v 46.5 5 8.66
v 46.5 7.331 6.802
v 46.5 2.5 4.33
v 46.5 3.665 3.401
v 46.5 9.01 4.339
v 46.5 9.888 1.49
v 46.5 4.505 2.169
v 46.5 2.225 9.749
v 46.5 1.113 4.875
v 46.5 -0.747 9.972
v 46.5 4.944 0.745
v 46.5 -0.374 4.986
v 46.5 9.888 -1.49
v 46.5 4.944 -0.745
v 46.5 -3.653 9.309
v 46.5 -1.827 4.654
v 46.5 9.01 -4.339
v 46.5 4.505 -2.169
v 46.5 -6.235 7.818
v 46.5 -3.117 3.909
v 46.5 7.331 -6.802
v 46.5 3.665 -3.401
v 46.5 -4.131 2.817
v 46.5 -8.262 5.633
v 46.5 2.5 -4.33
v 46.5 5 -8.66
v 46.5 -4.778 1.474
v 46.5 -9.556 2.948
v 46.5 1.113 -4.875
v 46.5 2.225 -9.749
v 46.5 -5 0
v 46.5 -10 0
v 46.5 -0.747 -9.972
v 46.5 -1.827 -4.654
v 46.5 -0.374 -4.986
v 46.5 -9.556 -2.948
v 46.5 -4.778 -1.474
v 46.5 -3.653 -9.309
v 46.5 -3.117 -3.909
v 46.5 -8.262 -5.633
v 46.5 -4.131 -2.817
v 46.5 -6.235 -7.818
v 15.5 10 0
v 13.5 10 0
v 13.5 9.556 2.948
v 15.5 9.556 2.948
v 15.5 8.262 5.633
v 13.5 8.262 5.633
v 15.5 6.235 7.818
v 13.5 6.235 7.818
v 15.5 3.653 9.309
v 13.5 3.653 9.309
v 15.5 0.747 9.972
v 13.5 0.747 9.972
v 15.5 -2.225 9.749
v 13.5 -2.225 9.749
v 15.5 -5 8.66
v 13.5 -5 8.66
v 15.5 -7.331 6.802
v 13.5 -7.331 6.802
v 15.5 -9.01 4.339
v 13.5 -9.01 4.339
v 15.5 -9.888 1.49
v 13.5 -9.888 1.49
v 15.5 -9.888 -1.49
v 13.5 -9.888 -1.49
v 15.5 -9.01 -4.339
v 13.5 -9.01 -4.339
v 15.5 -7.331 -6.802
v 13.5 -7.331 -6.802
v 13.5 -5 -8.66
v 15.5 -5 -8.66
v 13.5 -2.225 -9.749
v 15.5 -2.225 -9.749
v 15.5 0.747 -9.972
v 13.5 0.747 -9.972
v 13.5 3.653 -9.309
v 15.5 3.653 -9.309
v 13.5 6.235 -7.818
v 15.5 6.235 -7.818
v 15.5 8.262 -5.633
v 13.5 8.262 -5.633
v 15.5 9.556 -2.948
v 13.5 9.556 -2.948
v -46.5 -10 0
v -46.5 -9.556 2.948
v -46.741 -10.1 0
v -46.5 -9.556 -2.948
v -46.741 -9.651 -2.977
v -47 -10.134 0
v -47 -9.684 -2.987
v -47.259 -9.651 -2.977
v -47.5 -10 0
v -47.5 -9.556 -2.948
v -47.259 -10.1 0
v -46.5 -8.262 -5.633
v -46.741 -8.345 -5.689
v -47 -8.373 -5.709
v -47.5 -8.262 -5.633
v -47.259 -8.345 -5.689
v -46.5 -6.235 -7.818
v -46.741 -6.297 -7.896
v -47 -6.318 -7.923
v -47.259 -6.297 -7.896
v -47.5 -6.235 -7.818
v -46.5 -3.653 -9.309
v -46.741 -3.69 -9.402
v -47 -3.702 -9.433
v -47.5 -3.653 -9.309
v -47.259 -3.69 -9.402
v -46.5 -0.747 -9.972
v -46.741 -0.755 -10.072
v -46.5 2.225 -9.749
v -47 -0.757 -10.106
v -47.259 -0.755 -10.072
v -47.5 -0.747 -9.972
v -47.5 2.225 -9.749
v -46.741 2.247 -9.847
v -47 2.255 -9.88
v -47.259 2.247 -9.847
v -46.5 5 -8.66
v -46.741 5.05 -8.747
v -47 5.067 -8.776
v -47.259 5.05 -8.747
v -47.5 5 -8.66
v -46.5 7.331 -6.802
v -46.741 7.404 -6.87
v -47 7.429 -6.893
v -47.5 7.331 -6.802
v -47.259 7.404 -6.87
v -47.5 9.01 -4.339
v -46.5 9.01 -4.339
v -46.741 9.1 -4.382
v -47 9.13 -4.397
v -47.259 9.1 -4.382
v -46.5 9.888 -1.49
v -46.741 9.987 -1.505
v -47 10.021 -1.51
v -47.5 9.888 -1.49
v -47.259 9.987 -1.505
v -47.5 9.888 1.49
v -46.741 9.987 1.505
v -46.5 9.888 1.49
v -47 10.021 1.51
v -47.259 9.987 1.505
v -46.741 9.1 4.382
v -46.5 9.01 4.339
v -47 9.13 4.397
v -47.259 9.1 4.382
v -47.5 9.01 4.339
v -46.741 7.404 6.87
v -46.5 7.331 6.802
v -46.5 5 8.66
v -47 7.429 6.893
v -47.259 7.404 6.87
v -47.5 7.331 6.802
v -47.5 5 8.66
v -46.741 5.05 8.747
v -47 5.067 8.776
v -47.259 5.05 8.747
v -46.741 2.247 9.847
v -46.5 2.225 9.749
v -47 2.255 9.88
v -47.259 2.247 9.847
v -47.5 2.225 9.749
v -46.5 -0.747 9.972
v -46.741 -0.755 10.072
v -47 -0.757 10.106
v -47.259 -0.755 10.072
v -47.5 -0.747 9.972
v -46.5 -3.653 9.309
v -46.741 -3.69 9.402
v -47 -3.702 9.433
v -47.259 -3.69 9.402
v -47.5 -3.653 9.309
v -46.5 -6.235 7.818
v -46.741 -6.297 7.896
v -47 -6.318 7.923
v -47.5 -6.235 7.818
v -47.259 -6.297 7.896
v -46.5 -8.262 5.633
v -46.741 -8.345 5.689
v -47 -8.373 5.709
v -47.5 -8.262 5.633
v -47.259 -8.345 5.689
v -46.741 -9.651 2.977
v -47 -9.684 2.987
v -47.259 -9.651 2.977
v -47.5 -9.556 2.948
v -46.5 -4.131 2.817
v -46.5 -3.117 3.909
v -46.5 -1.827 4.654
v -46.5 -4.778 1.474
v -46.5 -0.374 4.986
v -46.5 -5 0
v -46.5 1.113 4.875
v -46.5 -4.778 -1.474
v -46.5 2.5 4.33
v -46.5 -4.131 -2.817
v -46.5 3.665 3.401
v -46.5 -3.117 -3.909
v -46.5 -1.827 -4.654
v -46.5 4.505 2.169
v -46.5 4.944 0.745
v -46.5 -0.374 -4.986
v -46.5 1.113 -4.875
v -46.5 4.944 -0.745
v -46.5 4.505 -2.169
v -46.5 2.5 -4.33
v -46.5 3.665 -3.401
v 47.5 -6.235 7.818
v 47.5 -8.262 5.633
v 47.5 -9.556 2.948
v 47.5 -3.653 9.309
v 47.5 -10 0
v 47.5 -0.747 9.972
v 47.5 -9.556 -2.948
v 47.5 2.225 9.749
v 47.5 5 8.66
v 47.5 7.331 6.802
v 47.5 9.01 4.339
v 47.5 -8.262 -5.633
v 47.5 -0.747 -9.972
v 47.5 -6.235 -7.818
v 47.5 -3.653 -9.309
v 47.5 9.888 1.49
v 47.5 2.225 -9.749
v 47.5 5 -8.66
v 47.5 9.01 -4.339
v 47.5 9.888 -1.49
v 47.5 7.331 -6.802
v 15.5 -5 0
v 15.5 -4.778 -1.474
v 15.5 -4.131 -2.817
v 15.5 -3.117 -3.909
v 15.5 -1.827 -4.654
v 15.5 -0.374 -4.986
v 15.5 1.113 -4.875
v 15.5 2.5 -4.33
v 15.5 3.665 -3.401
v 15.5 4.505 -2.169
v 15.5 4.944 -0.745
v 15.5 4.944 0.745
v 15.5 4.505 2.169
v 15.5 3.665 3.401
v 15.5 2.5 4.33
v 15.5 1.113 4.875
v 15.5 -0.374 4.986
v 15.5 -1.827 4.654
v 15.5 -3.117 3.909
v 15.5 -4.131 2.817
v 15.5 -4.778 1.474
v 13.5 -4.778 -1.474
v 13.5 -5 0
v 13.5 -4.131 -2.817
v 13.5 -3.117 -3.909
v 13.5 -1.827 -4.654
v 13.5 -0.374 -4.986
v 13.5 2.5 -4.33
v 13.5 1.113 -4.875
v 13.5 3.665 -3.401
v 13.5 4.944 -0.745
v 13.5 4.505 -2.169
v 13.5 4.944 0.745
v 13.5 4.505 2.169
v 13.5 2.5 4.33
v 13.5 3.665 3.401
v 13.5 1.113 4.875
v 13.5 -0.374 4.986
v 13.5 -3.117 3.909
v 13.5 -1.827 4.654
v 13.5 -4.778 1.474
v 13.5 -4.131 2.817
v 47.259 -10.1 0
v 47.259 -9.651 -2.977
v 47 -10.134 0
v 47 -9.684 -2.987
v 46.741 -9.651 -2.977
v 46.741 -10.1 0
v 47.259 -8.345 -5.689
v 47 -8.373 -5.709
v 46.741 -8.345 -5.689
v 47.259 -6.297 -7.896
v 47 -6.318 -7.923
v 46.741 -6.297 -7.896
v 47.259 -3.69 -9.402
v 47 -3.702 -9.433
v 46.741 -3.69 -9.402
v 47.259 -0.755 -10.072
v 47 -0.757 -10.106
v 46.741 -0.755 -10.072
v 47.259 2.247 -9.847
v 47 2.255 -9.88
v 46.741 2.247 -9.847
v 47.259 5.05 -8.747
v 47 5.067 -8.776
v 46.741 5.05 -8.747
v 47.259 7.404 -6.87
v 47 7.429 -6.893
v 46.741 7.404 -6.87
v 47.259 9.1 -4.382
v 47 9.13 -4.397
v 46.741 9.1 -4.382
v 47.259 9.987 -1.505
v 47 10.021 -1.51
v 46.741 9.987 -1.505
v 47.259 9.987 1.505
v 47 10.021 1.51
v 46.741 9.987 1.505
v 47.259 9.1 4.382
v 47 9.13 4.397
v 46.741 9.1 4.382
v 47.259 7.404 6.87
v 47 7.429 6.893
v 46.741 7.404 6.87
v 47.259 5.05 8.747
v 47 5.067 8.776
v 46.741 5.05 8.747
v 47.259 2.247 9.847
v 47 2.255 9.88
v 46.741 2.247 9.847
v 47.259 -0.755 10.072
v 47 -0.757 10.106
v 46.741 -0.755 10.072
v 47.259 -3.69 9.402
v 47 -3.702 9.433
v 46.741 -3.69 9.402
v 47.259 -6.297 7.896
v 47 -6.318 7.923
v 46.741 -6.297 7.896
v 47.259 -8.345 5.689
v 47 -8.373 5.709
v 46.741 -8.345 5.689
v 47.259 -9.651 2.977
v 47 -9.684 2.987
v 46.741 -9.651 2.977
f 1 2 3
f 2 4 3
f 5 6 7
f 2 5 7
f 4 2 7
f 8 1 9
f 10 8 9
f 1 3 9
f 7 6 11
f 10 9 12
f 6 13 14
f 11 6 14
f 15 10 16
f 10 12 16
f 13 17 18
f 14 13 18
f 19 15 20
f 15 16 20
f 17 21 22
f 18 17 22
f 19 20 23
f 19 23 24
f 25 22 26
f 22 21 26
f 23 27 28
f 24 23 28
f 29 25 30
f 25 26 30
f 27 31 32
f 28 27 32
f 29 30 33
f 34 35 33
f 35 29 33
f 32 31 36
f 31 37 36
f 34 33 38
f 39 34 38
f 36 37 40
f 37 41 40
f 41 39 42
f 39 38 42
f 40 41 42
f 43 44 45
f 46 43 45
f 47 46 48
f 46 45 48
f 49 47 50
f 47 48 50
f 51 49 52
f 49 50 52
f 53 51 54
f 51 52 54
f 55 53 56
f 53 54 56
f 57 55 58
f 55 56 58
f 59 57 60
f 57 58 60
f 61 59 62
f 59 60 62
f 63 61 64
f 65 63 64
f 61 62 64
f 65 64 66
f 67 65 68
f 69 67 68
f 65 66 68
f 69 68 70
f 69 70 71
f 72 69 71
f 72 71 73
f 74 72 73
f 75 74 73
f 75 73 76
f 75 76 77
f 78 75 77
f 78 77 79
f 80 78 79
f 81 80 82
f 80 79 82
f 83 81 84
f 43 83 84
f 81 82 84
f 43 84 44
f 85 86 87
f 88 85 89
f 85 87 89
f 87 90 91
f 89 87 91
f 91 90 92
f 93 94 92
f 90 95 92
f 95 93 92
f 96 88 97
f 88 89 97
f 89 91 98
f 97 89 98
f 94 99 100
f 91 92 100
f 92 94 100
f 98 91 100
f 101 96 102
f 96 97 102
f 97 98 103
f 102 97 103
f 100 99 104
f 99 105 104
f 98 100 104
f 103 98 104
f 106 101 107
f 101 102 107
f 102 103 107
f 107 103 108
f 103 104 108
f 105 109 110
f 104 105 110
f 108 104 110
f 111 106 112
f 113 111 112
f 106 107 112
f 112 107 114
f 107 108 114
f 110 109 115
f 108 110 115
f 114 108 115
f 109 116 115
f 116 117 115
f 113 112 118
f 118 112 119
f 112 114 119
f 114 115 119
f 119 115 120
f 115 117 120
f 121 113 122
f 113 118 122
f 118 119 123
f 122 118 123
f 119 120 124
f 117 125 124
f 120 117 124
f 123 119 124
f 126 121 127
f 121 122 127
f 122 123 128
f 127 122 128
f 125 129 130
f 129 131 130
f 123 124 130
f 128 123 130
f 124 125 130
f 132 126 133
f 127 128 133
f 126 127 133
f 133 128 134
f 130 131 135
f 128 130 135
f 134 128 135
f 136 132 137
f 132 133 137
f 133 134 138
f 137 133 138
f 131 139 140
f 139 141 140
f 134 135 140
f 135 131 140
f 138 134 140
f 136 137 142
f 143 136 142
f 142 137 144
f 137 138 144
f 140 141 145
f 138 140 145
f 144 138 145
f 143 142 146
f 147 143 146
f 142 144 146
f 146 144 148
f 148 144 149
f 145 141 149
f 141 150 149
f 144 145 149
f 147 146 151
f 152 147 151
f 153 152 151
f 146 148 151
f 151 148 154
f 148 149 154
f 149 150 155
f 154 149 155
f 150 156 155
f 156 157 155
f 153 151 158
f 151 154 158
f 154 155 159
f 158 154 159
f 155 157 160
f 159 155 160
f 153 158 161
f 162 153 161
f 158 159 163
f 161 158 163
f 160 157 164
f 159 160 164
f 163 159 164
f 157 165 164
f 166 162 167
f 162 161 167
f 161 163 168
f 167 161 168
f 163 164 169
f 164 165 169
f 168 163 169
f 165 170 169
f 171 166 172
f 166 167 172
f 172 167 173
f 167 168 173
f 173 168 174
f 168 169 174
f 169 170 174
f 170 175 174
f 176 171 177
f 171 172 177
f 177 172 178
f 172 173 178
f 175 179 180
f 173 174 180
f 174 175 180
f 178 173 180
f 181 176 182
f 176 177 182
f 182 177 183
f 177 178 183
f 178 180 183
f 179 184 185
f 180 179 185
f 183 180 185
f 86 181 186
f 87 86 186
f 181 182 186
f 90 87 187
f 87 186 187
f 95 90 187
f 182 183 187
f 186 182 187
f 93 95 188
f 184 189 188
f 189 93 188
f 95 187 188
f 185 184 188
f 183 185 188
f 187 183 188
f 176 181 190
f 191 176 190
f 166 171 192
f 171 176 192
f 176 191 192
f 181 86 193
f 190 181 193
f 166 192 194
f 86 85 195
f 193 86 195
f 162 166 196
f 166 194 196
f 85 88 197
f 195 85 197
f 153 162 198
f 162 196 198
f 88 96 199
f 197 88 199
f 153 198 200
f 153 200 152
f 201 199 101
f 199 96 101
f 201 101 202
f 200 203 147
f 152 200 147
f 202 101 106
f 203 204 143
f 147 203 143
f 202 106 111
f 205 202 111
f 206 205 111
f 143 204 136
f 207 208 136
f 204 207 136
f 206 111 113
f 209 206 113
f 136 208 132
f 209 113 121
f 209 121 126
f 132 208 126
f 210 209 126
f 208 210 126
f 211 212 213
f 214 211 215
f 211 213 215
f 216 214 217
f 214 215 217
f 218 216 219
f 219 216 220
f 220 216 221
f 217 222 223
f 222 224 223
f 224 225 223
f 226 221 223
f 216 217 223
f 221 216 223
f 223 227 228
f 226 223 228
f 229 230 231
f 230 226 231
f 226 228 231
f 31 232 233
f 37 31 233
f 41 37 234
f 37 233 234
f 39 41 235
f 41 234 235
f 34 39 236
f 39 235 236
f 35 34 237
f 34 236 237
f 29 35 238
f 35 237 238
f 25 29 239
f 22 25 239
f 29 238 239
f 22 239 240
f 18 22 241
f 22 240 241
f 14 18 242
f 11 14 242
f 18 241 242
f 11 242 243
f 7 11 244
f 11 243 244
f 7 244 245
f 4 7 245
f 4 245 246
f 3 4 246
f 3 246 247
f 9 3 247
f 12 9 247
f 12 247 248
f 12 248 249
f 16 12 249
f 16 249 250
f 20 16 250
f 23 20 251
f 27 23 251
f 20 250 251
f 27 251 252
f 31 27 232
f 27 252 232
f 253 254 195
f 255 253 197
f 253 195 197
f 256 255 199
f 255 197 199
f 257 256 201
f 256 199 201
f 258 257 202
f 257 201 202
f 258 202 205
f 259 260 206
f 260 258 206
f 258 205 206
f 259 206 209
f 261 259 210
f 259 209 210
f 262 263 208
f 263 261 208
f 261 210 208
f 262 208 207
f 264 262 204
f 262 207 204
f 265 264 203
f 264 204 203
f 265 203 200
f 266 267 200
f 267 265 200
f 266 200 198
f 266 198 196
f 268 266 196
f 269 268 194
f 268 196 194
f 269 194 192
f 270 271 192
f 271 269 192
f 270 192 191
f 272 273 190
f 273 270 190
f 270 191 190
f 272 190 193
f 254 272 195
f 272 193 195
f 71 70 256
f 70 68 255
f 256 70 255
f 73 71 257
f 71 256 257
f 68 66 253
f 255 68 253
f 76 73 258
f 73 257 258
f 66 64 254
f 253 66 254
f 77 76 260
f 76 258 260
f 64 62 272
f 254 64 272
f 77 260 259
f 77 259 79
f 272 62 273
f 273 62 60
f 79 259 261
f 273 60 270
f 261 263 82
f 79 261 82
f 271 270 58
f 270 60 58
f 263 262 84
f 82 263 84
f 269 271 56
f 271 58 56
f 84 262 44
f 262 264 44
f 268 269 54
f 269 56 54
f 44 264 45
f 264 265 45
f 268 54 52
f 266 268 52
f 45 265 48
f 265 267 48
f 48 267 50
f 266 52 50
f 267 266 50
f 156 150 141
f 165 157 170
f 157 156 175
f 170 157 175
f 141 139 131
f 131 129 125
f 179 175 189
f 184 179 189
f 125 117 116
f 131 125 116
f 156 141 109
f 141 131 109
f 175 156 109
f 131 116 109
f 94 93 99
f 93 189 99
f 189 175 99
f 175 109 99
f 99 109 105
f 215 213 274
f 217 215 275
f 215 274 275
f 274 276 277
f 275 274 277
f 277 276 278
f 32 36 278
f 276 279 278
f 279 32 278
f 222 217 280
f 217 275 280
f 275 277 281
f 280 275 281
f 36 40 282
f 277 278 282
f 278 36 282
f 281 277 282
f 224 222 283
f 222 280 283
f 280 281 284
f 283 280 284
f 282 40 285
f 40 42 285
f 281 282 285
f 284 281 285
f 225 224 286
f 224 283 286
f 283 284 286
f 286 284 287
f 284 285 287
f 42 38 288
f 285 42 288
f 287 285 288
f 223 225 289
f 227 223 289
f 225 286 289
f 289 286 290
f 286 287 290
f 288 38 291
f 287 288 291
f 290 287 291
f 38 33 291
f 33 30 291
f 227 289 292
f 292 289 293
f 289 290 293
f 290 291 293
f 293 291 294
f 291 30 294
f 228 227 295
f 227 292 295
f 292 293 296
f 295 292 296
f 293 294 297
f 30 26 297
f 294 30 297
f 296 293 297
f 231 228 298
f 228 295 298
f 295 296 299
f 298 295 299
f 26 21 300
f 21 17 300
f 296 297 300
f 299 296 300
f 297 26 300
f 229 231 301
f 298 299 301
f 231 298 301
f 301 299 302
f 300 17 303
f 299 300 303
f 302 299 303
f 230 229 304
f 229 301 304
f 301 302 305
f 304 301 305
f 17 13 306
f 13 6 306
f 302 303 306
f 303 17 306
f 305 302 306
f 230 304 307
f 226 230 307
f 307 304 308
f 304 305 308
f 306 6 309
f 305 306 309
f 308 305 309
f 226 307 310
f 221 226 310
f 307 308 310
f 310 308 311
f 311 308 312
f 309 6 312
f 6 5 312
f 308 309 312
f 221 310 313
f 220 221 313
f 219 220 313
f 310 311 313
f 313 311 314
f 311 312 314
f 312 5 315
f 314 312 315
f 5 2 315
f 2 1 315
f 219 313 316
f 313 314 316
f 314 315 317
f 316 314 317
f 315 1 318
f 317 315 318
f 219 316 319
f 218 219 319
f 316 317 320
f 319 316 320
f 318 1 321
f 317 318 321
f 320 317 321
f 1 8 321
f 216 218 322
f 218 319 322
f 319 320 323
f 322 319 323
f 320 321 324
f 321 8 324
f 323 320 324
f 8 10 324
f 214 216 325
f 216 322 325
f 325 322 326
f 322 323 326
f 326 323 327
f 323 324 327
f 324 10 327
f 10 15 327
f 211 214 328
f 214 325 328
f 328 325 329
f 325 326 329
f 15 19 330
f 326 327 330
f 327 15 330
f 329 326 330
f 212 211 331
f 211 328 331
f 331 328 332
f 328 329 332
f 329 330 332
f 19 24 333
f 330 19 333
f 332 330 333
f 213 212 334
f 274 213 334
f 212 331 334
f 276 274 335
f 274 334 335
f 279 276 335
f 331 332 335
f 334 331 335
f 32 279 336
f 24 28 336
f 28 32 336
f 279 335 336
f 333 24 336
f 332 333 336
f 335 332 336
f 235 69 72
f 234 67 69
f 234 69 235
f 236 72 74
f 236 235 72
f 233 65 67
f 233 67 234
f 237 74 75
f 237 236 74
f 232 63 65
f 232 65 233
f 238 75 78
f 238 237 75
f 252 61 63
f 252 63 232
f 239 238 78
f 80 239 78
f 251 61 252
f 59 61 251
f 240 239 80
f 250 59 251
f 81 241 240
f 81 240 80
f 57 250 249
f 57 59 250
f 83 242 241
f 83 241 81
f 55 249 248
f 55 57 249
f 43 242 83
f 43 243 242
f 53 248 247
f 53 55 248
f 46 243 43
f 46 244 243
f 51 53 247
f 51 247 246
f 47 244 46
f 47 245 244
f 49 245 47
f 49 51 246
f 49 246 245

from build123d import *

# Parameters (mm, degrees)
SKETCH2_R           = 10
BOSS_EXTRUDE1_DEPTH = 2


with BuildPart() as part:
    # Sketch1 → Revolve1 (revolve)
    with BuildSketch(Plane.XY):
        with BuildLine():
            Line((-47.5, 0), (47.5, 0))
            Line((47.5, 0), (47.5, -10))
            ThreePointArc((47.5, -10), (47, -10.133974596), (46.5, -10))
            Line((46.5, -10), (46.5, -5))
            Line((46.5, -5), (-46.5, -5))
            Line((-46.5, -5), (-46.5, -10))
            ThreePointArc((-46.5, -10), (-47, -10.133974596), (-47.5, -10))
            Line((-47.5, -10), (-47.5, 0))
        make_face()
    revolve(axis=Axis((-47.5, 0, 0), (1, 0, 0)))

    # Sketch2 → Boss-Extrude1 (add)
    with BuildSketch(Plane(origin=(13.5, 0, 0), x_dir=(0, 0, -1), z_dir=(1, 0, 0))):
        with Locations(Location((0, 0, 0), (0, 0, 90))):
            Circle(SKETCH2_R)
    extrude(amount=BOSS_EXTRUDE1_DEPTH)


solid = part.part
